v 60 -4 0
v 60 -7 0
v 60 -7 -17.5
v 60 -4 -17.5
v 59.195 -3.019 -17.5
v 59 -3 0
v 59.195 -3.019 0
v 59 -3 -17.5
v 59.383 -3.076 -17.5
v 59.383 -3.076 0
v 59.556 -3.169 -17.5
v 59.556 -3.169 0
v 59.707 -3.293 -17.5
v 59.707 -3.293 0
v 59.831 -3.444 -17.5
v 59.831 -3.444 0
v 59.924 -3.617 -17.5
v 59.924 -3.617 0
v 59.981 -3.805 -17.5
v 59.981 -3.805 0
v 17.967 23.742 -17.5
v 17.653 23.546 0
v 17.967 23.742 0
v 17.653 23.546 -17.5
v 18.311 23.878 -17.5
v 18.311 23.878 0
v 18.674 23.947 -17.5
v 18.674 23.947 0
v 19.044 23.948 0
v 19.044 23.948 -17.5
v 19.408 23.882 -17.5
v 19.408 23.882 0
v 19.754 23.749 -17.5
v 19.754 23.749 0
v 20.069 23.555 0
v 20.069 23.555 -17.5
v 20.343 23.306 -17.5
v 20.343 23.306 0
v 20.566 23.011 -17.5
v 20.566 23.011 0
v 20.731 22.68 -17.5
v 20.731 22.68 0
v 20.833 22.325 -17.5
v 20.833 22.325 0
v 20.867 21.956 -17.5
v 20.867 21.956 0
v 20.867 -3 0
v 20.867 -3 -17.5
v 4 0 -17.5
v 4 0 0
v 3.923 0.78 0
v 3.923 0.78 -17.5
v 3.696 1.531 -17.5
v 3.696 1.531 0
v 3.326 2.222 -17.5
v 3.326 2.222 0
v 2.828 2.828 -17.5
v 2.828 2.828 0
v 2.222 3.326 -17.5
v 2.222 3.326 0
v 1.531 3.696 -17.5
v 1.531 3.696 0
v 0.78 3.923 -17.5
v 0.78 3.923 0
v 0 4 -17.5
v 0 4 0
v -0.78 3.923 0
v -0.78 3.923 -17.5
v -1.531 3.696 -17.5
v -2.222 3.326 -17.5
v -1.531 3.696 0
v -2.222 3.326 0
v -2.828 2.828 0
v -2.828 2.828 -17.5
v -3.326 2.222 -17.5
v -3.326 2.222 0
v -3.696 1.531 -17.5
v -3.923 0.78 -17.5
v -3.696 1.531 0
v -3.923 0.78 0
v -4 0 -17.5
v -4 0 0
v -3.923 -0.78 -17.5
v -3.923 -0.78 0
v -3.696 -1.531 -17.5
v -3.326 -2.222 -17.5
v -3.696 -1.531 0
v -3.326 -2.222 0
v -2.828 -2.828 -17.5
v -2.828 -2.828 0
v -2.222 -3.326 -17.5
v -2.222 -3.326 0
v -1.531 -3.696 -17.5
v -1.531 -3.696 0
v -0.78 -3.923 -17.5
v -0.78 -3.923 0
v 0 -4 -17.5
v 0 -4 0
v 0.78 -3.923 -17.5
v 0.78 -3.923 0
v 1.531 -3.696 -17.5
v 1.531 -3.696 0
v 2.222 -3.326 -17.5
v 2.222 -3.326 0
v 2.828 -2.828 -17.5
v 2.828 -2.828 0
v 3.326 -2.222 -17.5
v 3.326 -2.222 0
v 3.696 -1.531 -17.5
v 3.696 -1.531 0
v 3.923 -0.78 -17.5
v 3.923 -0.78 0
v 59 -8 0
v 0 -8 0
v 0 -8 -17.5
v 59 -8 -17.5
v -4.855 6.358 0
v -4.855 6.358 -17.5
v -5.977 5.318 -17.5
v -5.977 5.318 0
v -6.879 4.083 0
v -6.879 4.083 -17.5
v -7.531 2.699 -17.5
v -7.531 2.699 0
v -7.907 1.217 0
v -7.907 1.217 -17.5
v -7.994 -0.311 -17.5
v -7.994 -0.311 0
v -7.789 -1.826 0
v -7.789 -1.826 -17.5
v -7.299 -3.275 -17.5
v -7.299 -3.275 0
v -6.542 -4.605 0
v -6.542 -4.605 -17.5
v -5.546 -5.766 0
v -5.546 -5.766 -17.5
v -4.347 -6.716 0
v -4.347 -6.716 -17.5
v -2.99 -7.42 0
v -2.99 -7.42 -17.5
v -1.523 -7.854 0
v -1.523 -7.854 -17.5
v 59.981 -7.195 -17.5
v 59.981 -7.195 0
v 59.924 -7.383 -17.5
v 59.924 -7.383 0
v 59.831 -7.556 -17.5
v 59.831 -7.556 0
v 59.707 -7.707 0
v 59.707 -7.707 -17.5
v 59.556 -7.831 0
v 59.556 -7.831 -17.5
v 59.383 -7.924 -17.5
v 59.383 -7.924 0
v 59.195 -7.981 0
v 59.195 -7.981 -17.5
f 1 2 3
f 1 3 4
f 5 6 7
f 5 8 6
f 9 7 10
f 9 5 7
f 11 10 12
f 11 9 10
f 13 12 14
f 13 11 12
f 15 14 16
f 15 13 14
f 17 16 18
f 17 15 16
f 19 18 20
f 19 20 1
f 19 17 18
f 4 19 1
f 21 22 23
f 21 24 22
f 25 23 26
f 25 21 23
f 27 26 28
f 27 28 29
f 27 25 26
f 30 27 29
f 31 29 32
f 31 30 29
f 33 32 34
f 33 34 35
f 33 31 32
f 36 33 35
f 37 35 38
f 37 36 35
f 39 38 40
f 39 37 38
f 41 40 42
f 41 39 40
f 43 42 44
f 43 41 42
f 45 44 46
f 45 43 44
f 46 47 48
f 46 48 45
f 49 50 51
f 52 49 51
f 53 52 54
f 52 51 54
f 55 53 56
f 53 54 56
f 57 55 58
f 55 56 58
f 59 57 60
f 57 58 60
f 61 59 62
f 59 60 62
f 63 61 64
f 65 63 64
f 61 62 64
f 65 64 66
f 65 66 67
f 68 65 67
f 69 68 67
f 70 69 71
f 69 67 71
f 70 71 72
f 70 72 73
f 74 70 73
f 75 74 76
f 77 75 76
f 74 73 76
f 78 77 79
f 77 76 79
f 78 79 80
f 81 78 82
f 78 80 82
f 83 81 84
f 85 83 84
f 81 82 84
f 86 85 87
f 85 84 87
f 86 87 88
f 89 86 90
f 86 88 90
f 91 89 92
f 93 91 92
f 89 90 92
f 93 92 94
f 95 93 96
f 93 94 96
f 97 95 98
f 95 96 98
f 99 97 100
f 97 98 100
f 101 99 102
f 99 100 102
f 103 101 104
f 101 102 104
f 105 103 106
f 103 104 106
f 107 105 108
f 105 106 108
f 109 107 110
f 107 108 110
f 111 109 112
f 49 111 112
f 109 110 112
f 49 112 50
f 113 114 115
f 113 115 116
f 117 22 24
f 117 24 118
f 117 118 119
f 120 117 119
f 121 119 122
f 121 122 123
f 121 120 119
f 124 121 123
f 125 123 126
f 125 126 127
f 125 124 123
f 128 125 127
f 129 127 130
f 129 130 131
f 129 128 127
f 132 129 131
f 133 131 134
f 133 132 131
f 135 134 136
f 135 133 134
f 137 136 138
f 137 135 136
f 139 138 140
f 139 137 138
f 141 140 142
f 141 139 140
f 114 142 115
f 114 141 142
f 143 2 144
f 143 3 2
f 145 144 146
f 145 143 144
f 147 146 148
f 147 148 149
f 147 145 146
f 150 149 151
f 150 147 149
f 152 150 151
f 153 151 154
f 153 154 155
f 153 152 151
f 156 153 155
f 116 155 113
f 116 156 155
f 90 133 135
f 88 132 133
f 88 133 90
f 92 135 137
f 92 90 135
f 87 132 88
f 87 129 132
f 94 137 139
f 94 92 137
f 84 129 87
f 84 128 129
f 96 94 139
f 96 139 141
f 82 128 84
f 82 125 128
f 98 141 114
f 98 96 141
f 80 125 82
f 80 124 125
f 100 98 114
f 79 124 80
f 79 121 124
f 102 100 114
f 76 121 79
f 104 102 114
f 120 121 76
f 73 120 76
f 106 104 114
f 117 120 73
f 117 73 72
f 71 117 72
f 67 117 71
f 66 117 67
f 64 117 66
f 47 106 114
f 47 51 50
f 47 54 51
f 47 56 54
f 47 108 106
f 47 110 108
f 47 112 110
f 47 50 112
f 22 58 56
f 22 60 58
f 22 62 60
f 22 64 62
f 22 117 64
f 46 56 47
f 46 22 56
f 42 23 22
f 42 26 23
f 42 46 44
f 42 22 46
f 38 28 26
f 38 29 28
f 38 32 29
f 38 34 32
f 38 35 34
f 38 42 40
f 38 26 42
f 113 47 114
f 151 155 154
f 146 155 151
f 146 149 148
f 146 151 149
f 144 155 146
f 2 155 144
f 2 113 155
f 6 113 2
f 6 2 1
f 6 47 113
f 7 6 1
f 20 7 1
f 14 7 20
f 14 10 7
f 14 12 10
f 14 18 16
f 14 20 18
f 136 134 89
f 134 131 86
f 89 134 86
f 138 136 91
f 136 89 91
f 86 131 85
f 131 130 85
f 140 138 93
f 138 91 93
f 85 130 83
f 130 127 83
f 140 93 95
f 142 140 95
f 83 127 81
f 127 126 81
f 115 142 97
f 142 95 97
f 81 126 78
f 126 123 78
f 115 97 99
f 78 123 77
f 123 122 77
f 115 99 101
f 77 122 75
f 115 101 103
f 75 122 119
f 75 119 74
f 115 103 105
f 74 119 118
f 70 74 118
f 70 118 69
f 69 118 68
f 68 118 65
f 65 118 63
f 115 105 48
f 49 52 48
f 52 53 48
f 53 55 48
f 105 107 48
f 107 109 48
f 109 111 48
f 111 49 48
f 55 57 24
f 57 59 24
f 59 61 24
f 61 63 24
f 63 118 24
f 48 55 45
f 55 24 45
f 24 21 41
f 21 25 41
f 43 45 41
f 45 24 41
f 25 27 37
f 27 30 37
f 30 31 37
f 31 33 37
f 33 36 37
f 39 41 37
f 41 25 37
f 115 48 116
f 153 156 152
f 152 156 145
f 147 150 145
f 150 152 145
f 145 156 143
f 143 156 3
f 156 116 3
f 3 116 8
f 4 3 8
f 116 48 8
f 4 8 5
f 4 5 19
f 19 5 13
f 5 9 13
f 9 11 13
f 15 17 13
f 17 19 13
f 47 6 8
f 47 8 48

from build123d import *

# Parameters (mm, degrees)
ESQUISSE1_R        = 8
ESQUISSE1_R_2      = 4
BOSS_EXTRU_2_DEPTH = 17.5
CONG_1_R           = 2
CONG_2_R           = 1


with BuildPart() as part:
    # Esquisse1 → Boss.-Extru.2 (new body)
    # profile 1 of 2: a face of its own
    with BuildSketch(Plane.XY):
        with BuildLine():
            Line((20.866963315, 26), (-4.855214383, 6.358214631))
            ThreePointArc((-4.855214383, 6.358214631), (3.546708681, 7.17083381), (8, 0))
            ThreePointArc((8, 0), (5.656854249, -5.656854249), (0, -8))
            Line((0, -8), (60, -8))
            Line((60, -8), (60, -3))
            Line((60, -3), (20.866963315, -3))
            Line((20.866963315, -3), (20.866963315, 26))
        make_face()
    # profile 2 of 2: a face of its own
    with BuildSketch(Plane.XY):
        Circle(ESQUISSE1_R)
        Circle(ESQUISSE1_R_2, mode=Mode.SUBTRACT)
    extrude(amount=-BOSS_EXTRU_2_DEPTH)

    # Congé1
    cong_1_edges = [part.edges().sort_by_distance(p)[0] for p in [
        (20.866963315, 26, -8.75),
    ]]
    fillet(cong_1_edges, radius=CONG_1_R)

    # Congé2
    cong_2_edges = [part.edges().sort_by_distance(p)[0] for p in [
        (60, -3, -8.75),
        (60, -8, -8.75),
    ]]
    fillet(cong_2_edges, radius=CONG_2_R)


solid = part.part
